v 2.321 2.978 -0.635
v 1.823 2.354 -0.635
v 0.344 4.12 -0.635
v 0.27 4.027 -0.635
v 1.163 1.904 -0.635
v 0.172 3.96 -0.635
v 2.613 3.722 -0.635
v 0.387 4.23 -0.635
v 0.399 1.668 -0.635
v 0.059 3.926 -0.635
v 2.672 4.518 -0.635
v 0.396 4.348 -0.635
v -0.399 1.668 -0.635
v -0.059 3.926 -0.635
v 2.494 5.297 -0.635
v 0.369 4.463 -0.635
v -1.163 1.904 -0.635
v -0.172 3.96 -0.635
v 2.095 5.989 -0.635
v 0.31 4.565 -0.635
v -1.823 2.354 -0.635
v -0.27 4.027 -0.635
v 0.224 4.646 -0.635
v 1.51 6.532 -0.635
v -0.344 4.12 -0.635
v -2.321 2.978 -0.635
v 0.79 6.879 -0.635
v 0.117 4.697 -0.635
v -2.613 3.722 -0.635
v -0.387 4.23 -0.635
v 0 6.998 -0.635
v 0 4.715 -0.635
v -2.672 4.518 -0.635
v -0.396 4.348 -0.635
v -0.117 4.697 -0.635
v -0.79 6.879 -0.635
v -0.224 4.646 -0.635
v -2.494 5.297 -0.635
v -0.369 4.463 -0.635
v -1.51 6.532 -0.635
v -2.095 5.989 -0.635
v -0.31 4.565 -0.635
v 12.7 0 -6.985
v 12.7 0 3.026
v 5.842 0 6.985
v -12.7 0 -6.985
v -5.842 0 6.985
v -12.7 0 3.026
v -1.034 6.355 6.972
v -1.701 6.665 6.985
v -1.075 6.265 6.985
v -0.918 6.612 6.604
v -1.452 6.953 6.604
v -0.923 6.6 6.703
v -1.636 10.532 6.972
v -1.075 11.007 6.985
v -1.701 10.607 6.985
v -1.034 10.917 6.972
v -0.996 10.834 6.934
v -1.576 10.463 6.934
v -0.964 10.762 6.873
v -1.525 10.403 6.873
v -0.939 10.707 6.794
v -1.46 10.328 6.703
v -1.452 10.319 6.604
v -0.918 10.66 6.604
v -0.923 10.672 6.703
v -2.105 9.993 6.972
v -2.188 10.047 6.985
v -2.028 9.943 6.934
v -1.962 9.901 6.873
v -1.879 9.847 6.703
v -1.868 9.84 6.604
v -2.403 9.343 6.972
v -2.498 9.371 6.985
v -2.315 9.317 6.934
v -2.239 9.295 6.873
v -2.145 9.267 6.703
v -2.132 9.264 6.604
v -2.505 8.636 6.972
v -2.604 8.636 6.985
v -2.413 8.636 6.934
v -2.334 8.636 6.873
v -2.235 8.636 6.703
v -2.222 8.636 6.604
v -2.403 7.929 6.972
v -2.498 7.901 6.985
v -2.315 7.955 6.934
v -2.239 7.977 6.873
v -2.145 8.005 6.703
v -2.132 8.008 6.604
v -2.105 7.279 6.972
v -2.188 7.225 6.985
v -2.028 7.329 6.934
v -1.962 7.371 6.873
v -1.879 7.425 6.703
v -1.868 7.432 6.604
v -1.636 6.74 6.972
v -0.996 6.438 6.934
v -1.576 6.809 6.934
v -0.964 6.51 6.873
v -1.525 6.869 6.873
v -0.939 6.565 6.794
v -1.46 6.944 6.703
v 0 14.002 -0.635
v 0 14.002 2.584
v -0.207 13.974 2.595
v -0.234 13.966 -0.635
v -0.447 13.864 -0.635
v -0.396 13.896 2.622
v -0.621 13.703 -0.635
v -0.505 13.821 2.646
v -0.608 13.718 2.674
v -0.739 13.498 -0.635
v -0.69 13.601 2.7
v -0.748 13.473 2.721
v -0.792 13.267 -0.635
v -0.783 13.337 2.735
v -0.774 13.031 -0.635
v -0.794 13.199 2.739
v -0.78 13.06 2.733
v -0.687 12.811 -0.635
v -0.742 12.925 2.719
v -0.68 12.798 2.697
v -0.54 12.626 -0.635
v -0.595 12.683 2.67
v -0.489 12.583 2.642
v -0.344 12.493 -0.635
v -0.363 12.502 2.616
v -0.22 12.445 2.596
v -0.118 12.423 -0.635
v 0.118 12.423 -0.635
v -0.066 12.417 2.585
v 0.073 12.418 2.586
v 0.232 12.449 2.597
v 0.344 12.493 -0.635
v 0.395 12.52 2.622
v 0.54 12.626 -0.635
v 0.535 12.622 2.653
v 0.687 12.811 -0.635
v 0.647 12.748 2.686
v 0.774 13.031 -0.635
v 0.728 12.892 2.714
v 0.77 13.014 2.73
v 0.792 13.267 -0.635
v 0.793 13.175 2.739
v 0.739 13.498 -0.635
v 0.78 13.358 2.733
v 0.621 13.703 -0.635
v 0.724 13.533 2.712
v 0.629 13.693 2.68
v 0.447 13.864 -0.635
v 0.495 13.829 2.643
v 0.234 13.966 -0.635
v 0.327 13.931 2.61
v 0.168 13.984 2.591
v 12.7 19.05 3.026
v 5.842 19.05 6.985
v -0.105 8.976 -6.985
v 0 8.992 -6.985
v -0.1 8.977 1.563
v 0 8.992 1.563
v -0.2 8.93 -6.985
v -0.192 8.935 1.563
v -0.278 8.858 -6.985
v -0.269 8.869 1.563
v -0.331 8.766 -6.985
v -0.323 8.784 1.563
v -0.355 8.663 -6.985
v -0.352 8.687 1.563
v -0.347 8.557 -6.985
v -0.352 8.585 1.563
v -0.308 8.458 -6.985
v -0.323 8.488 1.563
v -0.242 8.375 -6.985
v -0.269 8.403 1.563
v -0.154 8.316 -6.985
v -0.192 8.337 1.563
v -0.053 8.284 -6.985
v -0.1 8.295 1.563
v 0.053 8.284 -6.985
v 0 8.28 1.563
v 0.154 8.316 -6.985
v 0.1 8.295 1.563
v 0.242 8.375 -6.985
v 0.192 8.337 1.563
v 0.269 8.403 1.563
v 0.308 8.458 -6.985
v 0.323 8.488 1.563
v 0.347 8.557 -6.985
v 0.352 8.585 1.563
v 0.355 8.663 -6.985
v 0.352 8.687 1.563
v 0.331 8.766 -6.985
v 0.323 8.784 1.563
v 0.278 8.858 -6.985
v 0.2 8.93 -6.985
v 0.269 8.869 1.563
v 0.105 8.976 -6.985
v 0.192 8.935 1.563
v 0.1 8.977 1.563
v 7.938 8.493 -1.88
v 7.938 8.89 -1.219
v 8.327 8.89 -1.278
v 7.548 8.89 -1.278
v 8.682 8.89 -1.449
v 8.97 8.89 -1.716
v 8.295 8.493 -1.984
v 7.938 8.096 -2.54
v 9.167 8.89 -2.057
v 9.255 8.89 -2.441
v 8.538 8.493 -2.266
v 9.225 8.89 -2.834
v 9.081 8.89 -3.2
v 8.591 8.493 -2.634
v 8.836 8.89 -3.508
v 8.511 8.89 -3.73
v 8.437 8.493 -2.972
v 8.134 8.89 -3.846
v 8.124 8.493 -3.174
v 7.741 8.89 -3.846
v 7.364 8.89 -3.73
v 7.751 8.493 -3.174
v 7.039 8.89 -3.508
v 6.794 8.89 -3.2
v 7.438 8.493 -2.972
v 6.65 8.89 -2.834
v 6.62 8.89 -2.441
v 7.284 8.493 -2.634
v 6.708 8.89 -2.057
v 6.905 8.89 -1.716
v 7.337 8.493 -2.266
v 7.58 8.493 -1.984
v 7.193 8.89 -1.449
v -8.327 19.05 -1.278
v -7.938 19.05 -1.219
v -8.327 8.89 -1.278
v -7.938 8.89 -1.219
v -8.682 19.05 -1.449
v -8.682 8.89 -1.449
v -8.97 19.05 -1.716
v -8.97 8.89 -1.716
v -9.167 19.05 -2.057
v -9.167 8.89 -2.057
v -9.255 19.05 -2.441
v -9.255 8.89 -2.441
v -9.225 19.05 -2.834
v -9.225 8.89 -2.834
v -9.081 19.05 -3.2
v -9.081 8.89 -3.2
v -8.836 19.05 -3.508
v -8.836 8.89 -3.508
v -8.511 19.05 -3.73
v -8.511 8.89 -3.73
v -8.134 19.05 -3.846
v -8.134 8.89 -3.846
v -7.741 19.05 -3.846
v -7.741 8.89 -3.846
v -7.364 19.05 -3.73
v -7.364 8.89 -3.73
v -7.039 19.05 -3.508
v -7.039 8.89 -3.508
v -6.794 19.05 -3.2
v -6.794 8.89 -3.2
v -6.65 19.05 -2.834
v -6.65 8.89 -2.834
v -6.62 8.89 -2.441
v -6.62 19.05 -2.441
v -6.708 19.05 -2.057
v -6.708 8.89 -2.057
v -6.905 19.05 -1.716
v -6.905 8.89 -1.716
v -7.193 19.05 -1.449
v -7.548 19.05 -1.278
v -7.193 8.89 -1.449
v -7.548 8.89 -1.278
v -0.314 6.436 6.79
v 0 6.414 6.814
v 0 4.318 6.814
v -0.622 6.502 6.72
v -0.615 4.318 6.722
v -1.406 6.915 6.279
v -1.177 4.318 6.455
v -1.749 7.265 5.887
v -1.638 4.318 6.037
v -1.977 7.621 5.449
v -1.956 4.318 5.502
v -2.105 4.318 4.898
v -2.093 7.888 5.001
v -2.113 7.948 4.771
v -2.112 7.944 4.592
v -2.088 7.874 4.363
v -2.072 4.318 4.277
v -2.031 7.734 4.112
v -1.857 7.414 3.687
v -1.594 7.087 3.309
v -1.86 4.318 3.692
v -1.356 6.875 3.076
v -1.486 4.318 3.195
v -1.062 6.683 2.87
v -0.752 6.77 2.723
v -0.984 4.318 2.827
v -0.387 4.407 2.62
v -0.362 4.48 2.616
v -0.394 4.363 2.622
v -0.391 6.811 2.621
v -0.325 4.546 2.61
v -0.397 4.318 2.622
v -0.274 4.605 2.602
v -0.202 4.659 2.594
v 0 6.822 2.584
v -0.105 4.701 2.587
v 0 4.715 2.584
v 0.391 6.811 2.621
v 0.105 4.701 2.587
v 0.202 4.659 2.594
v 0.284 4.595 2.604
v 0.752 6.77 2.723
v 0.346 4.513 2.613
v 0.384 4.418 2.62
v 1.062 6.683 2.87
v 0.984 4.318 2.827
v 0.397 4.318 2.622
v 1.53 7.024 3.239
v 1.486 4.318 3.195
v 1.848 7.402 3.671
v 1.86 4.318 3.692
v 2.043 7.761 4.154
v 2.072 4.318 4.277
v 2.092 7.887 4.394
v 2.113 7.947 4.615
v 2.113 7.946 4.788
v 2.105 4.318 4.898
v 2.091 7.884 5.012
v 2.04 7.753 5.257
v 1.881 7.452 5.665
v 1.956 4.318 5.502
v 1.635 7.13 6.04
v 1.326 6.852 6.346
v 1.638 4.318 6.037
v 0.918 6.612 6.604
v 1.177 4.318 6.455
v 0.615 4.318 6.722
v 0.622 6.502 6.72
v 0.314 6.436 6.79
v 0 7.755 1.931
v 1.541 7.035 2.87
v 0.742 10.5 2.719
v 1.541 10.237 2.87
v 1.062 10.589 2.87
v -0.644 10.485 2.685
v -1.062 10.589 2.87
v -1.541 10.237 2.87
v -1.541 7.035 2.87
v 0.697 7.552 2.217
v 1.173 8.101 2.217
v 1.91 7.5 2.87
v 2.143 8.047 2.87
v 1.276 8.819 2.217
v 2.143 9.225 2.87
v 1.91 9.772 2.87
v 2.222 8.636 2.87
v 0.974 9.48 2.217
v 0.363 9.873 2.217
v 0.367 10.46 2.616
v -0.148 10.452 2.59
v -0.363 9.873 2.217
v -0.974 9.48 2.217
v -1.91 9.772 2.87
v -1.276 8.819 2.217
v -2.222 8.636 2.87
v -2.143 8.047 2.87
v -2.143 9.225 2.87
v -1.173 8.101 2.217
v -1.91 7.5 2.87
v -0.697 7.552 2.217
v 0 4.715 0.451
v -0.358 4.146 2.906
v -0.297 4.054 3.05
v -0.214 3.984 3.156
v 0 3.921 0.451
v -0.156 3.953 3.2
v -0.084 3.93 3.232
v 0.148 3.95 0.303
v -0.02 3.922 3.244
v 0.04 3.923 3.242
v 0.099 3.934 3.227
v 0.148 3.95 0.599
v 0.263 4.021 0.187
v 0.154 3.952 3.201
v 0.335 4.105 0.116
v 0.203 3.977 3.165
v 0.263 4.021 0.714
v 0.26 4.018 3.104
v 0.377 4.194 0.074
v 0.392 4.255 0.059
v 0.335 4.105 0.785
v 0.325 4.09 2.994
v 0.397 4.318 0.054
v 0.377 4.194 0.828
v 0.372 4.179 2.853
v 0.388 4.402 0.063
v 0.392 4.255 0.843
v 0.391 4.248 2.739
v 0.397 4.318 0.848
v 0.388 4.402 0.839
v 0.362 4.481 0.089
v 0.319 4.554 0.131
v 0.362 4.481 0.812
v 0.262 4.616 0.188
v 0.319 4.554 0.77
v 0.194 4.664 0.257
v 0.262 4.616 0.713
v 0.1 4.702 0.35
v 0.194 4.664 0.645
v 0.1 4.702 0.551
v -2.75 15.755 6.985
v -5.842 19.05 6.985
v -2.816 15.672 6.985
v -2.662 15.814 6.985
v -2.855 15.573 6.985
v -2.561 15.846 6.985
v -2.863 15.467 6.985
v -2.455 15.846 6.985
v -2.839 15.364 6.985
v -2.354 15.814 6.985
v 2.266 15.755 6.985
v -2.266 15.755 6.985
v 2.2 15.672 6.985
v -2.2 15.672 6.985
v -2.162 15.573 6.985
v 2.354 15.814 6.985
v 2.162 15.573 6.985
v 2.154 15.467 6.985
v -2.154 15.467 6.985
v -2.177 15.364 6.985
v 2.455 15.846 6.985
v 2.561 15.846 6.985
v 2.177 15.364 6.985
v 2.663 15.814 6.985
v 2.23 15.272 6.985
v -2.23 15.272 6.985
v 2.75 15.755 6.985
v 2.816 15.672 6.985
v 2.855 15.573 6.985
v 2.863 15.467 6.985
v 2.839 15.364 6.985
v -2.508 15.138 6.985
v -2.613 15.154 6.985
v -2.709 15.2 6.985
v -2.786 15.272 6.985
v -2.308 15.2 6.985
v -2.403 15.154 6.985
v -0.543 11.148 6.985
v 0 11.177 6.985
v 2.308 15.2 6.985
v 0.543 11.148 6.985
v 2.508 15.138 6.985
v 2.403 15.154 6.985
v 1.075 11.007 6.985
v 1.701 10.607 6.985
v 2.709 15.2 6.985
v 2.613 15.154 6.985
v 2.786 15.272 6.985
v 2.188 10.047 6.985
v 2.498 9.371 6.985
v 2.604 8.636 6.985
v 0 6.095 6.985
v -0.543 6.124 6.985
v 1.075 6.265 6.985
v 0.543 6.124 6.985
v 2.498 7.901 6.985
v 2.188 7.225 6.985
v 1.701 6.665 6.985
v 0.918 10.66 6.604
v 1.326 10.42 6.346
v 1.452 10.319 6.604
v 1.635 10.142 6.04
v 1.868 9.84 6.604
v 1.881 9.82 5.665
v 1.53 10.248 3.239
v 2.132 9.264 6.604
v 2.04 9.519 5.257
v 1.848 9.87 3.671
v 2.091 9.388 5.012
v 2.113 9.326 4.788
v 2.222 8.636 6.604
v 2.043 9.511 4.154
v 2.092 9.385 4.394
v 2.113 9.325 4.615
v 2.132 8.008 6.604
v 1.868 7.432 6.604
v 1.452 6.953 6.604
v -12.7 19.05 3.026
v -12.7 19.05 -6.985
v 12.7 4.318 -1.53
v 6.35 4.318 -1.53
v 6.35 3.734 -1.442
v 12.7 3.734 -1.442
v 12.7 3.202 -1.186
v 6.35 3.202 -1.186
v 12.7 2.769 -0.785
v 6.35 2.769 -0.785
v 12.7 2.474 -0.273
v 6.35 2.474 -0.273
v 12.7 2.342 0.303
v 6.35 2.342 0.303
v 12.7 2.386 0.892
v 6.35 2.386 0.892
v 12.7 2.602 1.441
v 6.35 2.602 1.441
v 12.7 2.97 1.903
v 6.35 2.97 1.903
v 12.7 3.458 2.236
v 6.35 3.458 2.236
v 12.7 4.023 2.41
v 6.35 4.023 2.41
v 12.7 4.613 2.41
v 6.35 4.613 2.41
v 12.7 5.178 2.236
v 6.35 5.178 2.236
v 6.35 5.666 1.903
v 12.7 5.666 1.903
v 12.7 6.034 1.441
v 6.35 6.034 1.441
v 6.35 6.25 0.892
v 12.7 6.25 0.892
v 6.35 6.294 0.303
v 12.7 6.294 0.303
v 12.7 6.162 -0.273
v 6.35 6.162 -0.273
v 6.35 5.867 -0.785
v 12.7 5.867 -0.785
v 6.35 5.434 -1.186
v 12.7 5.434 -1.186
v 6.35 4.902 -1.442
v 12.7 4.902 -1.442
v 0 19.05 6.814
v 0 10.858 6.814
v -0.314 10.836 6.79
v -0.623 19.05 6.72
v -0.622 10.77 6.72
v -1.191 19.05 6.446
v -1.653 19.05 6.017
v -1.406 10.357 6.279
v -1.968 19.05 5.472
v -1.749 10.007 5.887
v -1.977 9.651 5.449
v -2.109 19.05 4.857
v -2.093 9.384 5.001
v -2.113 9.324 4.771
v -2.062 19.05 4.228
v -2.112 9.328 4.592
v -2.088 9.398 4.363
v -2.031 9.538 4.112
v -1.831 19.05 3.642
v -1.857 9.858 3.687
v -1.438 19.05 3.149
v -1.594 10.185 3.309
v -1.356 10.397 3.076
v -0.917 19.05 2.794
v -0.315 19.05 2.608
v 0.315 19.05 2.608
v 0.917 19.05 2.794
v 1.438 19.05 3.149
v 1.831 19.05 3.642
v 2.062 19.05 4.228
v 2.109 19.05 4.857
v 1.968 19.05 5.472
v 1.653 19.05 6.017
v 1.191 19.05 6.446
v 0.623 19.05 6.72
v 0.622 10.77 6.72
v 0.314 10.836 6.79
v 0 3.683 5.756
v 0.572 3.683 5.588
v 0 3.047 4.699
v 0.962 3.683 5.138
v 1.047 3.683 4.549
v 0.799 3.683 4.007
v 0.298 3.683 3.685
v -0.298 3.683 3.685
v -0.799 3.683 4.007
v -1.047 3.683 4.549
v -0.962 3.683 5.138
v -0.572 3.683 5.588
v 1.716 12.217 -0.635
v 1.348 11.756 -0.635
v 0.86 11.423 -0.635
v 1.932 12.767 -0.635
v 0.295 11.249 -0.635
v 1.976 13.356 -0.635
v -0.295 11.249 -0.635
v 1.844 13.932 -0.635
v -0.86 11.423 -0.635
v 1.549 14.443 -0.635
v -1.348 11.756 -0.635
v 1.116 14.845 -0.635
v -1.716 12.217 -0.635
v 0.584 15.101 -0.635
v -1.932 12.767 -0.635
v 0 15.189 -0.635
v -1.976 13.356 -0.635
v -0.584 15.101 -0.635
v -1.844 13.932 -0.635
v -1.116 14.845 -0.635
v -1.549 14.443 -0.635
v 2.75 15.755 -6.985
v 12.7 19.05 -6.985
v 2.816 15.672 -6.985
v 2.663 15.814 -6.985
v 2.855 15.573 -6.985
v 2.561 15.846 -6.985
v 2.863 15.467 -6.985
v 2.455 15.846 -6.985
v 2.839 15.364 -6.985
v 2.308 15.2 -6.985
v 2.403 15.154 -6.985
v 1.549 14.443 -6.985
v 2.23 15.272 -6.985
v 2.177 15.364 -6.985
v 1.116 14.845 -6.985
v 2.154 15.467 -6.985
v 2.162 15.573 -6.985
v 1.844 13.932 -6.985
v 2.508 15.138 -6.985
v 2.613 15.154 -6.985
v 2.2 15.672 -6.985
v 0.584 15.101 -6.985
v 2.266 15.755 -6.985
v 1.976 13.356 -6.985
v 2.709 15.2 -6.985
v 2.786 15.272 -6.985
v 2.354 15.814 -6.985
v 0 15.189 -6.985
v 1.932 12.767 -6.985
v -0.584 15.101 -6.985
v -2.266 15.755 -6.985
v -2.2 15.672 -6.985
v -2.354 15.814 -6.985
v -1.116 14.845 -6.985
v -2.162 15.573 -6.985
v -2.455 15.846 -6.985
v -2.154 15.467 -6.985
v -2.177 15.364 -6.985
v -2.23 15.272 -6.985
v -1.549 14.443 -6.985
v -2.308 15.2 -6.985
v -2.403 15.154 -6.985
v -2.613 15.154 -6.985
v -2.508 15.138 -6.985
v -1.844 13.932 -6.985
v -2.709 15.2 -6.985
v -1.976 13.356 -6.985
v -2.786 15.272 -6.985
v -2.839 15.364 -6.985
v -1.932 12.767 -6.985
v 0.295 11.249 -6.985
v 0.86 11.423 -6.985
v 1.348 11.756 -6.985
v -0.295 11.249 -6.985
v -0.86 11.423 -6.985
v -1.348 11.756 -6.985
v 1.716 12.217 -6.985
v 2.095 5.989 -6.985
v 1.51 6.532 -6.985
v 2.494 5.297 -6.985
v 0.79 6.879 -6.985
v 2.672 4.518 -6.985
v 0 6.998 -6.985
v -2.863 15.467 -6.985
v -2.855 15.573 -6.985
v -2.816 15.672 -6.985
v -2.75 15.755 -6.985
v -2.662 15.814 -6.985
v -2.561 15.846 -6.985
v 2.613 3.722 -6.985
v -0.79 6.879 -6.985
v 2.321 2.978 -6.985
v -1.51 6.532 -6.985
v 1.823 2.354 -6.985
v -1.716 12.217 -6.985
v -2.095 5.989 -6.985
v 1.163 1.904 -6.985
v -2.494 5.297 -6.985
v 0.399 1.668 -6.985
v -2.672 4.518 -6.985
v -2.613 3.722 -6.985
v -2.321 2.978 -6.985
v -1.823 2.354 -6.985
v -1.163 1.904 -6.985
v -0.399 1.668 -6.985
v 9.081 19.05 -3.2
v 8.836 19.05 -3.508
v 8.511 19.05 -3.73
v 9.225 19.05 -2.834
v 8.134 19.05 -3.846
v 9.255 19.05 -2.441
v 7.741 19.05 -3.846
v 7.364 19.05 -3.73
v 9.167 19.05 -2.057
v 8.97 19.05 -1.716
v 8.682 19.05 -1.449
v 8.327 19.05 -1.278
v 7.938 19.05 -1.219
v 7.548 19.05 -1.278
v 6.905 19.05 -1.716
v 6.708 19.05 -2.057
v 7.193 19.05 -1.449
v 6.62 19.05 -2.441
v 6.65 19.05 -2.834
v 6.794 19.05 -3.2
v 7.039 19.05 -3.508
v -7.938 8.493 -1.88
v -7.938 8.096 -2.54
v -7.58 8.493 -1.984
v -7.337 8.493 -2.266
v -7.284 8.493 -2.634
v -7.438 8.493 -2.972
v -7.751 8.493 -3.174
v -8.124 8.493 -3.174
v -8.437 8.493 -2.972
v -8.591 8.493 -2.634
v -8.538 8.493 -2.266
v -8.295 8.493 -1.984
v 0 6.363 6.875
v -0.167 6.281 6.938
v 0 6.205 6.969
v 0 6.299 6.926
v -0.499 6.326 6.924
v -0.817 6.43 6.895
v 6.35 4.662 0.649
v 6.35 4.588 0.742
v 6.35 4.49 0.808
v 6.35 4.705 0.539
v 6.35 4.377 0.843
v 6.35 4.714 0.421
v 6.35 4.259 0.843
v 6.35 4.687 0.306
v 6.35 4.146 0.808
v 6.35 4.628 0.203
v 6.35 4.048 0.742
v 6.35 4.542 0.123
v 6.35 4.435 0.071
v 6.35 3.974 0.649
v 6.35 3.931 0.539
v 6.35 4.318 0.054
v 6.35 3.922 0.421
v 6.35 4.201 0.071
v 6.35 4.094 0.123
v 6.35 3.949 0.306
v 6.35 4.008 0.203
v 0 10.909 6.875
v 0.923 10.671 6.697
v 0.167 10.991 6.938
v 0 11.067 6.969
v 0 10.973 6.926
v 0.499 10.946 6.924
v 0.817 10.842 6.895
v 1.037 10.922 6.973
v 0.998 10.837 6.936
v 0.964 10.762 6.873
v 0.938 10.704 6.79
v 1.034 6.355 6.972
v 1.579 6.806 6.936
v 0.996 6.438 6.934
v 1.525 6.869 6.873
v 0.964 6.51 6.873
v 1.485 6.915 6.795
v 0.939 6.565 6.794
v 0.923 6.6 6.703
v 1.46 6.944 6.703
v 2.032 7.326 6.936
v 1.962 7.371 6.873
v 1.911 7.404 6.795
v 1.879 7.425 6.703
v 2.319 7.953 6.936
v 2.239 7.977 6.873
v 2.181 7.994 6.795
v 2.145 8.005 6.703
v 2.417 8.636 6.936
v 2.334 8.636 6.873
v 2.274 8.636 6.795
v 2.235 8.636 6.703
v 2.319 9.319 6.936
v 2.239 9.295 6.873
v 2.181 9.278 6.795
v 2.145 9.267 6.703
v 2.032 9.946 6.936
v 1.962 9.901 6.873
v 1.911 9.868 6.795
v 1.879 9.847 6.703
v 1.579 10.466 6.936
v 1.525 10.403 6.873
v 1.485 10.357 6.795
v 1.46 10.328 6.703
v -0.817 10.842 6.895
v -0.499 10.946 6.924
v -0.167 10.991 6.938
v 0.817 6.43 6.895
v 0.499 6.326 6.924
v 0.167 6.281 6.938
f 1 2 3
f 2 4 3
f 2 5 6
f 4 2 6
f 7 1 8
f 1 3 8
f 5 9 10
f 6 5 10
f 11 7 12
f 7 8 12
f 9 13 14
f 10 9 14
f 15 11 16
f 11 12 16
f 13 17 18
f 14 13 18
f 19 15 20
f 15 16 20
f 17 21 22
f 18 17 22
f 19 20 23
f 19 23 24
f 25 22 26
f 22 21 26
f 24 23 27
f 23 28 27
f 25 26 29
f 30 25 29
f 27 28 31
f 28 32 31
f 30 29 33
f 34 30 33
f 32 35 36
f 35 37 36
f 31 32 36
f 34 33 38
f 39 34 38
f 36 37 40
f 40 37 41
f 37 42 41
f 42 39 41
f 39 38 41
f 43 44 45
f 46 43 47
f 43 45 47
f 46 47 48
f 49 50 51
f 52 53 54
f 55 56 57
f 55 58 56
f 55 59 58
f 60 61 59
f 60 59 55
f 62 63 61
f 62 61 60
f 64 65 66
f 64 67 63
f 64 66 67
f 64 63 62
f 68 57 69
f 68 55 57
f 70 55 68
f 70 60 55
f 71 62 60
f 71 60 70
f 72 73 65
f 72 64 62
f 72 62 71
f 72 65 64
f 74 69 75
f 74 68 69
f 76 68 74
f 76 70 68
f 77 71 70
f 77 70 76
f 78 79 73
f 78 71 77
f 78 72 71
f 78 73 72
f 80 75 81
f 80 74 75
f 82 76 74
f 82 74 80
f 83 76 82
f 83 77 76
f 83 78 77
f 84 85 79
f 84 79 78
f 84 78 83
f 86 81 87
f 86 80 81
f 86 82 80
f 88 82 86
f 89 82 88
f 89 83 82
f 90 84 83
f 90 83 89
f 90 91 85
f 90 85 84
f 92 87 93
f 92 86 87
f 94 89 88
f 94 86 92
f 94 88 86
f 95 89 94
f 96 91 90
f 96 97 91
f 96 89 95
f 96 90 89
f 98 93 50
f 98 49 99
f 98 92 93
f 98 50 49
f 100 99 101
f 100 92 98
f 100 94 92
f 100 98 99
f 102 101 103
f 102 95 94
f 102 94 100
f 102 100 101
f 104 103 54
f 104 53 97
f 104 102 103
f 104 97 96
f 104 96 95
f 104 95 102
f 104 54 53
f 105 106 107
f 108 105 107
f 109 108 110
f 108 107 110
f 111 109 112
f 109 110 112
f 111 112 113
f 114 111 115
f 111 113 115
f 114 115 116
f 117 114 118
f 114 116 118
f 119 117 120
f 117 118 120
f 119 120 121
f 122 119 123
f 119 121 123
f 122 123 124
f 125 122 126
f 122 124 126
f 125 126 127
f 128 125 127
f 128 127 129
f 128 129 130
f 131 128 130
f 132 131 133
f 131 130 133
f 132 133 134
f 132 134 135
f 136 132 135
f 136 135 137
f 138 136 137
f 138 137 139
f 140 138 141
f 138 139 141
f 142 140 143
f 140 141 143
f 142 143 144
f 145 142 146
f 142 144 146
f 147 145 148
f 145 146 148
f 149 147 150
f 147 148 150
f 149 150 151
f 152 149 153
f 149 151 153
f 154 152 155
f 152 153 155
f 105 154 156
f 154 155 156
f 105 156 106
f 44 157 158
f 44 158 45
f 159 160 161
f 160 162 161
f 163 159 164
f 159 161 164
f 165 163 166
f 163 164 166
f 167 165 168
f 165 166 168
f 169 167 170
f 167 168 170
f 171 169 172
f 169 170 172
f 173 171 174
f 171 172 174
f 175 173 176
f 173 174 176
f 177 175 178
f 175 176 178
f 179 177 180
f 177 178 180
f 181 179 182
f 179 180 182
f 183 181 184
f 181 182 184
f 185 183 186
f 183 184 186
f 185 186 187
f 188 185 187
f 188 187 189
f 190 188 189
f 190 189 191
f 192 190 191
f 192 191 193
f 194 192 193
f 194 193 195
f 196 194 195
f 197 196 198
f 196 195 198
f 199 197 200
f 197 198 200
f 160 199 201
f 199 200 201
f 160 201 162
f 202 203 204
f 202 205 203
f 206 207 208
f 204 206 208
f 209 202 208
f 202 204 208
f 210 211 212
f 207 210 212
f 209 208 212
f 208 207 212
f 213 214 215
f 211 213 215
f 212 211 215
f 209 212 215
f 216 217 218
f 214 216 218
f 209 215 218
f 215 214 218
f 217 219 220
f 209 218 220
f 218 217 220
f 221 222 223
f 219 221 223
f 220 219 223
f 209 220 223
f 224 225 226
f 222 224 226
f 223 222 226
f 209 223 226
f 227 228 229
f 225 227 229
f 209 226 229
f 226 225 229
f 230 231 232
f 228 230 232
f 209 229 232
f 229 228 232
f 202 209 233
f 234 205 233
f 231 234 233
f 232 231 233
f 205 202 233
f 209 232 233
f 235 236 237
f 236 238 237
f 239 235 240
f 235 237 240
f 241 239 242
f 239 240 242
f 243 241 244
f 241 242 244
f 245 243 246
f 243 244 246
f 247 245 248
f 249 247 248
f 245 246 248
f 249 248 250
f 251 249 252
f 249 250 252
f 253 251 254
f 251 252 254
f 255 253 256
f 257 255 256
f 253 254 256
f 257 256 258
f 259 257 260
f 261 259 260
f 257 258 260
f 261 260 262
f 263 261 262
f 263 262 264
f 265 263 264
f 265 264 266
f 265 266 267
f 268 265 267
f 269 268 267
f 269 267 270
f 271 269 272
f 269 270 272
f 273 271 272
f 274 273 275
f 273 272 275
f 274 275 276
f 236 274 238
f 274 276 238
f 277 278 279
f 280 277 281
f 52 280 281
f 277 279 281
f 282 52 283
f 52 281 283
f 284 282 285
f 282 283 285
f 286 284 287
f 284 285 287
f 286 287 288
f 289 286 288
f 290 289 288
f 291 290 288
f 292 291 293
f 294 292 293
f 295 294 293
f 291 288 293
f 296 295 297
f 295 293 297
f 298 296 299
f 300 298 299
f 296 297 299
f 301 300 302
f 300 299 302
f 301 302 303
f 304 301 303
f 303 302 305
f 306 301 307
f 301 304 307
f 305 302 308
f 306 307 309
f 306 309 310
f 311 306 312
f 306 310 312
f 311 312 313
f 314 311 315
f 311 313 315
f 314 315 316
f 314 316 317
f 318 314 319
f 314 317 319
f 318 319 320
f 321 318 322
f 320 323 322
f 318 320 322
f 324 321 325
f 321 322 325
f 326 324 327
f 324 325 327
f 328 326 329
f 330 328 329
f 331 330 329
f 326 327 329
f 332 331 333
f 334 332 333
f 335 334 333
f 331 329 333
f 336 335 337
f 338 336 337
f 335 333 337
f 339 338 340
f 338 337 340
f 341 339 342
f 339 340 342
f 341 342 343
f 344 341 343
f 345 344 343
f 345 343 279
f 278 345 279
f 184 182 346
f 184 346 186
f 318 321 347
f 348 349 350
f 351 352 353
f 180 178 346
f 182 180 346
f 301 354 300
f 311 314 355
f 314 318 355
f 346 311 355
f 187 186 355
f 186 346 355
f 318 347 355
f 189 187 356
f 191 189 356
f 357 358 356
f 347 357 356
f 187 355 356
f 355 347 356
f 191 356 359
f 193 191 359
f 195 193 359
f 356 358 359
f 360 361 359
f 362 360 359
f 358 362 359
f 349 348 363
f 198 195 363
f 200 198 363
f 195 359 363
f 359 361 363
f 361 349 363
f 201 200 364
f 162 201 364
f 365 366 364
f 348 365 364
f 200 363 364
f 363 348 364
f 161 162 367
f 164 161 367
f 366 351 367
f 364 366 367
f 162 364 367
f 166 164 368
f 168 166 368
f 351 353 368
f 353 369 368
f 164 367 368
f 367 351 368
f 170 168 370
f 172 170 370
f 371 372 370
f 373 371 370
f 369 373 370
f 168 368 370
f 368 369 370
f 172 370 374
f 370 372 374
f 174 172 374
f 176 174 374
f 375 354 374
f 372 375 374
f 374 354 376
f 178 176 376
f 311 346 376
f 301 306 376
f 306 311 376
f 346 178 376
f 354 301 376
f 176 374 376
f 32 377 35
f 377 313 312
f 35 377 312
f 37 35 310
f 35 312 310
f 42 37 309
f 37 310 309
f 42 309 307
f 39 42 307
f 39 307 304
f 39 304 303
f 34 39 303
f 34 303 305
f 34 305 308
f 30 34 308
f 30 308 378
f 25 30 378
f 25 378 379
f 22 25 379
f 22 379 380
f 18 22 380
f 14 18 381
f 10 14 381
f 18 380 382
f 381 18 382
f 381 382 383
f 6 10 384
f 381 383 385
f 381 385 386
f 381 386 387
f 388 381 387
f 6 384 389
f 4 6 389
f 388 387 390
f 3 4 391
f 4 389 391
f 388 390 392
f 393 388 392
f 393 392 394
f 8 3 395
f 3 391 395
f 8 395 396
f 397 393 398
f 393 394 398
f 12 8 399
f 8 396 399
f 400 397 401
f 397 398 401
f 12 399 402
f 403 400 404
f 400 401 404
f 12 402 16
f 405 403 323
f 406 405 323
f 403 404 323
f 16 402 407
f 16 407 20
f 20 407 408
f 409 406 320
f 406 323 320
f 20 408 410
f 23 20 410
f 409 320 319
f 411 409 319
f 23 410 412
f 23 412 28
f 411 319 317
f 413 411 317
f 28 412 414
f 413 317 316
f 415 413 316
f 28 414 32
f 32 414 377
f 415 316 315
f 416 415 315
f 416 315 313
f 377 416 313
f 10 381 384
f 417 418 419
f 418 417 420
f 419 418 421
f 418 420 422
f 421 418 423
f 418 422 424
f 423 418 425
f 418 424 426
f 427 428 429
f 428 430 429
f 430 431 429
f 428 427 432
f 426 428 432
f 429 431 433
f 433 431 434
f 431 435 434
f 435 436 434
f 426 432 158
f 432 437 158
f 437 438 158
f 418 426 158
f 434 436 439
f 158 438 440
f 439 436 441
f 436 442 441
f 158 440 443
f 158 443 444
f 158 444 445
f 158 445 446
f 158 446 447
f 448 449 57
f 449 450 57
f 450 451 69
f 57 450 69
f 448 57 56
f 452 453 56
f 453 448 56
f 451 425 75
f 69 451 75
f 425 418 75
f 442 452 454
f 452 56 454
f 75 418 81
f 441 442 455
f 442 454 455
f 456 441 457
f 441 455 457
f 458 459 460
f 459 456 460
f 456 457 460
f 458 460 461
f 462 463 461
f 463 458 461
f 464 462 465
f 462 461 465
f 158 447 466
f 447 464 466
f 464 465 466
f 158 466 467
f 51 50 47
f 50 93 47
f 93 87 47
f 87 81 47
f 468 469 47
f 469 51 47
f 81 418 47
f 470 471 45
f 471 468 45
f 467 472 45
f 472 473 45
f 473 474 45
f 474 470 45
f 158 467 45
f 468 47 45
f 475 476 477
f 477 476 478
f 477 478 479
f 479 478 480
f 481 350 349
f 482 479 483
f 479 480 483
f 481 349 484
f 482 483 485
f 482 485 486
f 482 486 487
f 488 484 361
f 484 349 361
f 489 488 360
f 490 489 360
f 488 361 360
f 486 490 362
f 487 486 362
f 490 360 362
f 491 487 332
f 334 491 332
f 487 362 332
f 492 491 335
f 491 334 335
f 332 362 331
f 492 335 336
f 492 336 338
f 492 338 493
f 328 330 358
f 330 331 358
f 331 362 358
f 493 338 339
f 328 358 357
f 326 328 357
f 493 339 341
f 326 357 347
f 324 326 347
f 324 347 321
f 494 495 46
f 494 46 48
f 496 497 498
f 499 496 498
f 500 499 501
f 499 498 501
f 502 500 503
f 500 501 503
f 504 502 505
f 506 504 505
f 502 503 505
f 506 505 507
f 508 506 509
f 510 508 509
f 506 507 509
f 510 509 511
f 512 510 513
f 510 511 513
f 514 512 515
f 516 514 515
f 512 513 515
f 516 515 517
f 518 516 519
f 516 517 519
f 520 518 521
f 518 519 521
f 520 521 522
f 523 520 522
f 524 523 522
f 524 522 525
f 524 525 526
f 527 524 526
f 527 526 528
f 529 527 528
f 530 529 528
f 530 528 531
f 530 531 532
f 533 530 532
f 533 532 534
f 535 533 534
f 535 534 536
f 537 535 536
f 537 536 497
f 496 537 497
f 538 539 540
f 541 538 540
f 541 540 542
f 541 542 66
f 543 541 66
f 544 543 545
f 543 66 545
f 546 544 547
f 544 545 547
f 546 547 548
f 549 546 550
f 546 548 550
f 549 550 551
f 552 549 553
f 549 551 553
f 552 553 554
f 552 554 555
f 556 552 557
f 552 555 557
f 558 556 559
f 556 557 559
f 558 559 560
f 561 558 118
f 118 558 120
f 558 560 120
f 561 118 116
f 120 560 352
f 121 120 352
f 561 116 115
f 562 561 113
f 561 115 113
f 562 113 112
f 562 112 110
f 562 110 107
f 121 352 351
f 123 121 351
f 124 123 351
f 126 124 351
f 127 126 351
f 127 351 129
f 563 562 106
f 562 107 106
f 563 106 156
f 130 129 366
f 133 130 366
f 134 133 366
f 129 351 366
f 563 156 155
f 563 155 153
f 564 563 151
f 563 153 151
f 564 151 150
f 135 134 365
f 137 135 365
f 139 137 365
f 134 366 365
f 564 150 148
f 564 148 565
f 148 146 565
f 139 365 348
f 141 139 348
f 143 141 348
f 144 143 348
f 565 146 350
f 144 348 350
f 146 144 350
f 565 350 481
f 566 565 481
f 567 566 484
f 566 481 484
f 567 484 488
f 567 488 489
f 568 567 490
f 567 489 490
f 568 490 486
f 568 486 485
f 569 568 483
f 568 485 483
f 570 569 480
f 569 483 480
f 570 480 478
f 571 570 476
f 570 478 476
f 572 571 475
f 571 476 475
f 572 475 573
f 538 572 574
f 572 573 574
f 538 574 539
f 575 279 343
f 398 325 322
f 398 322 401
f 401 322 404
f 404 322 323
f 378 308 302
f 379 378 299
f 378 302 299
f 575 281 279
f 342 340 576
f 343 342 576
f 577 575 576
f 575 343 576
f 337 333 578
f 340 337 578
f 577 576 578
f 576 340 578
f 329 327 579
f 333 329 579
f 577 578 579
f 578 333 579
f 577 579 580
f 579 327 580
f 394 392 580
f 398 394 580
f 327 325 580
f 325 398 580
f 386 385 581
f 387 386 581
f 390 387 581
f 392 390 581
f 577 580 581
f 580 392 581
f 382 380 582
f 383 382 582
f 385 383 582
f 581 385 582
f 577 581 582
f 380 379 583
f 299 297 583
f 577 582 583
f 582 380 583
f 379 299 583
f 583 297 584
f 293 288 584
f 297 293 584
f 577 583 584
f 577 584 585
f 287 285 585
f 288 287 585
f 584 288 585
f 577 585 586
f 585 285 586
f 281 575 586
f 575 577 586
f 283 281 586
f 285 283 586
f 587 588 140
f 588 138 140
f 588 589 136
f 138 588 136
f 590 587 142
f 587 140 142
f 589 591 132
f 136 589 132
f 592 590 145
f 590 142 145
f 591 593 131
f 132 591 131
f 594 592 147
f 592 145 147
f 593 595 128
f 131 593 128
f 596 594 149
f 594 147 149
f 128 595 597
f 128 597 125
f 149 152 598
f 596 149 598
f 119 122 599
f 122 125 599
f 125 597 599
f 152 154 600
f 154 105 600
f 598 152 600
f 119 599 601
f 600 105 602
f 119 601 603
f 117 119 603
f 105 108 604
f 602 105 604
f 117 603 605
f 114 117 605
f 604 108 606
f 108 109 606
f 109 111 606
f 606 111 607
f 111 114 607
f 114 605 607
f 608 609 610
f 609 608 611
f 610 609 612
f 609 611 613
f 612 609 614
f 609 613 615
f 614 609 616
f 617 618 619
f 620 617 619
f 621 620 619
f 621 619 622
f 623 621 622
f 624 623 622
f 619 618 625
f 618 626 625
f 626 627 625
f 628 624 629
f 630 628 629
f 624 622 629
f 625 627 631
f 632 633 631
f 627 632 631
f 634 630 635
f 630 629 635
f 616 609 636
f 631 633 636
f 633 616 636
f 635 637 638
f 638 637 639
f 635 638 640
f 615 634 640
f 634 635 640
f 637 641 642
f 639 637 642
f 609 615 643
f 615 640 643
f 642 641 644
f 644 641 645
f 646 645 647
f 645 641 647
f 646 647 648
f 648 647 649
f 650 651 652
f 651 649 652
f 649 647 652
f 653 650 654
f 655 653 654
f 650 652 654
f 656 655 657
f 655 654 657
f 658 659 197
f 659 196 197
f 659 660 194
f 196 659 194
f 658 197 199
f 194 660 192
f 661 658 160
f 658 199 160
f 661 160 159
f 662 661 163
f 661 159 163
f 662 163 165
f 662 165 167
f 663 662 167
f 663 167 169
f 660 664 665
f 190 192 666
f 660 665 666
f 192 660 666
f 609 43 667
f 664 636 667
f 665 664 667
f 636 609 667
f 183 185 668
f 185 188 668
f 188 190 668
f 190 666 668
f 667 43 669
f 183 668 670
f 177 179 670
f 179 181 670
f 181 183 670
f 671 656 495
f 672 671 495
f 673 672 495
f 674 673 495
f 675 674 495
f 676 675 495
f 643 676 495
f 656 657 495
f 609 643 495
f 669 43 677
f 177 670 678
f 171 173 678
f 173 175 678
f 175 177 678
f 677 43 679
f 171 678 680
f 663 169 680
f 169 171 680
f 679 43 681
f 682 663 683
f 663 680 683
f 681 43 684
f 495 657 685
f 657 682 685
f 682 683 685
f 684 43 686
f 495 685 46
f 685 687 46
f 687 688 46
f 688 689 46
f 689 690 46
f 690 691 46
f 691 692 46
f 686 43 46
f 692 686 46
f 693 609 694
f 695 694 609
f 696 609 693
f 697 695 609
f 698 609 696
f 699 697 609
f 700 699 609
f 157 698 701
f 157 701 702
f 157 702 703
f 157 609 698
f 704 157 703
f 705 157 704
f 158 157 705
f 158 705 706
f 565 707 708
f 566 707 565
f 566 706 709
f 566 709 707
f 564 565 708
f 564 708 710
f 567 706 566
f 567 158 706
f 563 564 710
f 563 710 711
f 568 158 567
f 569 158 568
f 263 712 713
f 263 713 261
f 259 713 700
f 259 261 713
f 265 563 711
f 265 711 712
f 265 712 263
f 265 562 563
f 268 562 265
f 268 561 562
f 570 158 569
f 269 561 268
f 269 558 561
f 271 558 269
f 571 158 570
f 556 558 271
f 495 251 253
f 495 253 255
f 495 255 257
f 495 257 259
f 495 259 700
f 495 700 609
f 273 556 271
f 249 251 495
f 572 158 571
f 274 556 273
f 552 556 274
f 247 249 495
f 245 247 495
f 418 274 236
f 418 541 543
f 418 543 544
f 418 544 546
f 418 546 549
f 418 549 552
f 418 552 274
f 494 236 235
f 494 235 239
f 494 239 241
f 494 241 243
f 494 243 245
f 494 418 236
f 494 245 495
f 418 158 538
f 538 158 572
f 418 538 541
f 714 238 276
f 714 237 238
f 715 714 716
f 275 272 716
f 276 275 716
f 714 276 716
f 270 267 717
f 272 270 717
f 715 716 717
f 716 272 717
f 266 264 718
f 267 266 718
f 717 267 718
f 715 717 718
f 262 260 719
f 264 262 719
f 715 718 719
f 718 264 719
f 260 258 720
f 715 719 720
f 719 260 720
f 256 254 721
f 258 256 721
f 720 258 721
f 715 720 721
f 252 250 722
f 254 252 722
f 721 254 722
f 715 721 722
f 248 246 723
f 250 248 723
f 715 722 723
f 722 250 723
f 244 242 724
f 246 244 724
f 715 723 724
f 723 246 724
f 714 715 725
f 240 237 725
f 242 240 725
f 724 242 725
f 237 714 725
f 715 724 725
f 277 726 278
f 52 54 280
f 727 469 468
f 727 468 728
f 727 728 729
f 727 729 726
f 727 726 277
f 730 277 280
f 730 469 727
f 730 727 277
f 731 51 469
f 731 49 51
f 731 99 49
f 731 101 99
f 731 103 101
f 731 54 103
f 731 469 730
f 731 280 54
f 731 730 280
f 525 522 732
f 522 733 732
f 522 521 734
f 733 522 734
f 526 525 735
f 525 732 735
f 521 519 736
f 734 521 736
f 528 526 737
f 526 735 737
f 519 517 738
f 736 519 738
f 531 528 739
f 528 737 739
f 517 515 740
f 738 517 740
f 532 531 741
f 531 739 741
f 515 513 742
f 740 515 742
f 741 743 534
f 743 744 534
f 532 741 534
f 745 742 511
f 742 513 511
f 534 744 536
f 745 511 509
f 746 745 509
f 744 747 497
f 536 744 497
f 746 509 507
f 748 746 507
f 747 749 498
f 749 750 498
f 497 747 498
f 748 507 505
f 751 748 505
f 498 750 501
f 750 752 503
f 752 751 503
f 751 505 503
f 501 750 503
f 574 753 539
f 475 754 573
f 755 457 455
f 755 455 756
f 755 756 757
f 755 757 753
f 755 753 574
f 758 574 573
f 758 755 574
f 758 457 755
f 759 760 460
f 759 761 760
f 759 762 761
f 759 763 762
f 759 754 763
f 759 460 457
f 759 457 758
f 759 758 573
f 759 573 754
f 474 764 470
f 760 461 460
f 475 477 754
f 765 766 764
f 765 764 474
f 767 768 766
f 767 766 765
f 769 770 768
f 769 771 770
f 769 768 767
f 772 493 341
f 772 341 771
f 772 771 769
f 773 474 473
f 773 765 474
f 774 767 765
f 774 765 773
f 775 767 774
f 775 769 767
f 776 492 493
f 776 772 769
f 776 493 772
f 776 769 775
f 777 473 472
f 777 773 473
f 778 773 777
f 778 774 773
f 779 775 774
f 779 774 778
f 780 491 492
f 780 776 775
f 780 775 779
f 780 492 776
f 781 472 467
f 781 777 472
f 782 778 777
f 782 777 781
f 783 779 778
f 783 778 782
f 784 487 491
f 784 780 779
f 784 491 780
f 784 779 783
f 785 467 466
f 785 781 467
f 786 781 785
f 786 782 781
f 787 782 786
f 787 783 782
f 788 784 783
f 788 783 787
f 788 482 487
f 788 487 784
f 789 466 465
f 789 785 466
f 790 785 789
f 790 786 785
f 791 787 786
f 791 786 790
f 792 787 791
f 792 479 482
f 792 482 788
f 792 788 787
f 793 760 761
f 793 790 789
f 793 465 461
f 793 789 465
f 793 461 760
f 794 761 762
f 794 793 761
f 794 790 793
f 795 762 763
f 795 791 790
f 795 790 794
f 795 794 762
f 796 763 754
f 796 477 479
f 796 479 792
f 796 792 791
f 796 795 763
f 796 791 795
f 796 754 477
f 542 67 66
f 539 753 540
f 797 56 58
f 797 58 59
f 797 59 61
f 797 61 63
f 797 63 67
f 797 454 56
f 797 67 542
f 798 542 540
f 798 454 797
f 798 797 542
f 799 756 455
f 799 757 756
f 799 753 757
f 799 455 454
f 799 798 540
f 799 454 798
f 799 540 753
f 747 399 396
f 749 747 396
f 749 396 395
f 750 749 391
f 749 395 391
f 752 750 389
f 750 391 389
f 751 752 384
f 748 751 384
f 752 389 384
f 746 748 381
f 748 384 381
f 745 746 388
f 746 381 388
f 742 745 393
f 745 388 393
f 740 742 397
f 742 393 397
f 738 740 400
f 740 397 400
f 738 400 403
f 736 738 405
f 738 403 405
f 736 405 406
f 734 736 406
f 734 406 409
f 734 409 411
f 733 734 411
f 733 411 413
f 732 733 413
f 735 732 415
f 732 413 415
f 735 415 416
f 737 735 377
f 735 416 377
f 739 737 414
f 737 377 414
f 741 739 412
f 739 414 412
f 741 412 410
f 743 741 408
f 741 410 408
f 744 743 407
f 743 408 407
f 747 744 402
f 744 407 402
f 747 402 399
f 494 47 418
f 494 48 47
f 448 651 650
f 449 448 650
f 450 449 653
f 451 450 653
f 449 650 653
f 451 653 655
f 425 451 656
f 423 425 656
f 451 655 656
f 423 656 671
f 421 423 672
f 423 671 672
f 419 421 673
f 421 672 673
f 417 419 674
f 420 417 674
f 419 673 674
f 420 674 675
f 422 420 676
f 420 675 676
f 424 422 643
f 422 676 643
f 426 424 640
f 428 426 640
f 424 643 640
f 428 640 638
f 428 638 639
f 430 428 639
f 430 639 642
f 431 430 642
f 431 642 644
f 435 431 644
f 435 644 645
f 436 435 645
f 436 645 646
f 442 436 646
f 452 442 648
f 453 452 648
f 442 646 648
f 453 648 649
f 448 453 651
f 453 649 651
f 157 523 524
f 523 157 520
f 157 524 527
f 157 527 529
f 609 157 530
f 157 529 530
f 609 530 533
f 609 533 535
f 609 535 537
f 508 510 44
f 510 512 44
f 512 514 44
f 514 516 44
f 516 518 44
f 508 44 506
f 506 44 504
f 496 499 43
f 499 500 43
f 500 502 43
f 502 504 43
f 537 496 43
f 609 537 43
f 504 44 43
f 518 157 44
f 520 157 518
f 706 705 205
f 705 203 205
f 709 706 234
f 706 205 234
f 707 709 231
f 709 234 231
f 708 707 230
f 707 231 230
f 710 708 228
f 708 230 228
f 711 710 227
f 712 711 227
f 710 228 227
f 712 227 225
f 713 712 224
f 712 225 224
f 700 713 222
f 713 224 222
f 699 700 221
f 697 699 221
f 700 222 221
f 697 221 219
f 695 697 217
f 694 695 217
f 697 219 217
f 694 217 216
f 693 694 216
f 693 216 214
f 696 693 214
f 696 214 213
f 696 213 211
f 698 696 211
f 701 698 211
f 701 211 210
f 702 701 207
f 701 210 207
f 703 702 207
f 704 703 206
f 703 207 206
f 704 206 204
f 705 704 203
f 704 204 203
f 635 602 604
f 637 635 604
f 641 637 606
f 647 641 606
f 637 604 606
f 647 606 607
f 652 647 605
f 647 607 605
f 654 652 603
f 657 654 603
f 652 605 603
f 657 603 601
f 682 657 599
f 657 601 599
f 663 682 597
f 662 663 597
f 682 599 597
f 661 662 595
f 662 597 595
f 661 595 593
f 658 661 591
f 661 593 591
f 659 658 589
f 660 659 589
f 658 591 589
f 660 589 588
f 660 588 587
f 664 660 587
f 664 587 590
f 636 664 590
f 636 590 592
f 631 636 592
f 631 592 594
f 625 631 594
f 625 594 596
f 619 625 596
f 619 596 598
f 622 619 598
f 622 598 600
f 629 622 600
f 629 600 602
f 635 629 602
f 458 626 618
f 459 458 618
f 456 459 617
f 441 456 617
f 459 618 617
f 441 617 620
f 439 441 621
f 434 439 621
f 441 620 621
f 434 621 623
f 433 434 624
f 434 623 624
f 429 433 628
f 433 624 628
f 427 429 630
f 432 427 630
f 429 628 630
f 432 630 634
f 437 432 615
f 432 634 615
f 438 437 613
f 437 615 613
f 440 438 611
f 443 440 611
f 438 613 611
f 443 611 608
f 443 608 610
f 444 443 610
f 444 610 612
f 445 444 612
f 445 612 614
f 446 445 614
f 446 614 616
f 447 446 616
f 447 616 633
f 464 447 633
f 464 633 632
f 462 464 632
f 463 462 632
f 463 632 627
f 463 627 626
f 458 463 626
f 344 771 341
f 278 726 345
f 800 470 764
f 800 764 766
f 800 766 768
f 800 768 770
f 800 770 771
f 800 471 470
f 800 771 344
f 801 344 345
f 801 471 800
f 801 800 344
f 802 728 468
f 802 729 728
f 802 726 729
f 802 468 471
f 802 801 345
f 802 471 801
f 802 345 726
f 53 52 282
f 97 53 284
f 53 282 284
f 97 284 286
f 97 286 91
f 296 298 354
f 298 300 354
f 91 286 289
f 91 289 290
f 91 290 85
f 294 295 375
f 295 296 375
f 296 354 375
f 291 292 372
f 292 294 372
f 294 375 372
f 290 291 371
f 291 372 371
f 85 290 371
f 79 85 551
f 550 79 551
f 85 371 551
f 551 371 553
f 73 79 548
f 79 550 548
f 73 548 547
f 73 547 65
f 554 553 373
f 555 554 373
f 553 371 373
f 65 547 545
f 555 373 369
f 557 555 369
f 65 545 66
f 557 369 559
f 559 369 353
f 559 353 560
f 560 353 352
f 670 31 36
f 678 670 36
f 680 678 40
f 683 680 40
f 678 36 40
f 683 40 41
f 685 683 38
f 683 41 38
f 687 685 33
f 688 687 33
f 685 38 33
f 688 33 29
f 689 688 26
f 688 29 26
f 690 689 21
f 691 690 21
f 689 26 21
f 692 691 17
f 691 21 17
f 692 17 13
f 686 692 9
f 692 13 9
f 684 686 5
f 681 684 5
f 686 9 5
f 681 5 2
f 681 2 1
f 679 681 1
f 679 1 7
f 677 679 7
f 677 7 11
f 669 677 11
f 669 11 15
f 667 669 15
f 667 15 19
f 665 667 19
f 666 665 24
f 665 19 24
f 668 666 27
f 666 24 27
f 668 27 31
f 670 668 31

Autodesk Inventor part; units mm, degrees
ref_plane "YZ Plane" through (0, 0, 0) normal (1, 0, 0) x (0, 1, 0)
ref_plane "XZ Plane" through (0, 0, 0) normal (0, 1, 0) x (-1, 0, 0)
ref_plane "XY Plane" through (0, 0, 0) normal (0, 0, 1) x (1, 0, 0)
sketch "Sketch1" plane through (0, 0, 0) normal (0, 1, 0) x (-1, 0, 0)
  line L0 (12.7, 6.985) -> (-12.7, 6.985)
  line L1 (-12.7, 6.985) -> (-12.7, -6.985)
  line L2 (-12.7, -6.985) -> (12.7, -6.985)
  line L3 (12.7, -6.985) -> (12.7, 6.985)
  point P0 (0, 0)
  dimension "depth" = 25.4
  dimension "width" = 13.97
  dimension "d5" = 6.985
  dimension "d6" = 12.7
extrude "body" add sketch "Sketch1" along normal blind 19.05
sketch "Sketch3" plane through (12.7, 0, 6.985) normal (1, 0, 0) x (0, 0, -1)
  point P0 (6.985, 0)
sketch "Sketch5" plane through (0, 19.05, 0) normal (0, 1, 0) x (1, 0, 0)
  line L0 (-12.7, -6.985) -> (12.7, -6.985) projected
  point P0 (0, 0)
  point P1 (0, -4.699)
  dimension "d25" = 0
  dimension "d34" = 6.985
  dimension "hole_radius" = 2.286
hole "main odor hole" at (0, 19.05, 4.699) direction (0, -1, 0) diameter 4.2291 depth 14.732 tip angle 118
sketch "Sketch6" plane through (-12.7, 0, 6.985) normal (0, 0, 1) x (1, 0, 0)
  line L0 (0, 0) -> (25.4, 0) projected
  point P0 (12.7, 0)
  point P1 (15.2082, 15.494)
  point P2 (10.1917, 15.494)
  dimension "d126" = 15.494
  dimension "d127" = 5.0165
  dimension "d128" = 2.5082
hole "lickports" at (2.5083, 15.494, 6.985) at (-2.5082, 15.494, 6.985) direction (0, 0, -1) diameter 0.7112 end through all
sketch "Sketch7" plane through (12.7, 0, -6.985) normal (0, 0, -1) x (-1, 0, 0)
  line L0 (14.8146, 4.318) -> (10.5855, 4.318) projected
  point P0 (12.7, 0)
  point P1 (12.7, 4.318)
hole "fitting threads" at (0, 4.318, -6.985) direction (0, 0, 1) diameter 5.3594 depth 6.35 thread size "1/4-28 UNF" class "2B" standard "ANSI Unified Screw Threads"
sketch "Sketch8" plane through (0, 4.318, -0.635) normal (0, 0, -1) x (-1, 0, 0)
  line L0 (2.1146, 0) -> (-2.1145, 0) projected
  point P0 (0, -4.318)
  point P1 (0, 0)
hole "input odor hole" at (0, 4.318, -0.635) direction (0, 0, 1) diameter 0.7937 depth 5.08
sketch "Sketch9" plane through (-12.7, 0, 6.985) normal (0, 0, 1) x (1, 0, 0)
  line L0 (0, 0) -> (25.4, 0) projected
  point P0 (12.7, 0)
  point P1 (12.7, 8.636)
  point P2 (12.7, 0)
  dimension "nose_hole" = 8.636
hole "nose_hole" at (0, 8.636, 6.985) direction (0, 0, -1) diameter 4.445 depth 4.1148 tip angle 110
sketch "Sketch10" plane through (0, 19.05, 0) normal (0, 1, 0) x (1, 0, 0)
  point P0 (0, 0)
  point P1 (7.9375, 2.54)
  point P2 (-7.9375, 2.54)
  dimension "d70" = 2.54
  dimension "d116" = 15.875
  dimension "d117" = 7.9375
hole "mount holes" at (7.9375, 19.05, -2.54) at (-7.9375, 19.05, -2.54) direction (0, -1, 0) diameter 2.6416 depth 10.16 tip angle 118 thread size "6-32 UNC" class "2B" standard "ANSI Unified Screw Threads"
sketch "Sketch11" plane through (12.7, 0, -6.985) normal (0, 0, -1) x (-1, 0, 0)
  line L0 (0, 19.05) -> (25.4, 19.05) projected
  line L1 (0, 0) -> (25.4, 0) projected
  point P0 (12.7, 0)
  point P1 (12.7, 13.208)
  point P2 (12.7, 0)
  dimension "vacuum_height" = 5.842
hole "exhaust threading" at (0, 13.208, -6.985) direction (0, 0, 1) diameter 3.9624 depth 6.35 thread size "10-32 UNF" class "2B" standard "ANSI Unified Screw Threads"
sketch "Sketch12" plane through (0, 13.208, -0.635) normal (0, 0, -1) x (-1, 0, 0)
  line L0 (-12.7, -13.208) -> (12.7, -13.208) projected
  line L1 (-12.7, 5.842) -> (12.7, 5.842) projected
  point P0 (0, -13.208)
  point P1 (0, 0)
  point P2 (0, -13.208)
  dimension "d87" = 5.842
hole "exhaust hole" at (0, 13.208, -0.635) direction (0, 0, 1) diameter 1.5875 depth 5.08
sketch "Sketch16" plane through (12.7, 0, -6.985) normal (0, 0, -1) x (-1, 0, 0)
  circle A0 centre (12.7, 8.636) radius 2.9083 projected
  line L0 (15.6083, 8.636) -> (12.7, 8.636)
  point P0 (12.7, 0)
hole "sniff_monitoring_hole" at (0, 8.636, -6.985) direction (0, 0, 1) diameter 0.7112 end through all
fillet "nose hole fillet" [suppressed]
sketch "Sketch25" plane through (12.7, 0, 6.985) normal (1, 0, 0) x (0, 0, -1)
  line L0 (7.62, 1.6383) -> (7.62, 6.9977) projected
  point P0 (6.985, 0)
  point P1 (7.62, 4.318)
  point P2 (6.5343, 4.318)
  point P3 (4.363, 4.318)
  dimension "d147" = 3.257
  dimension "d148" = 1.0857
hole "vac fitting" at (12.7, 4.318, 0.4507) direction (-1, 0, 0) diameter 3.9624 depth 6.35 thread size "10-32 UNF" class "2B" standard "ANSI Unified Screw Threads"
hole "vac hole" at (6.35, 4.318, 0.4507) direction (-1, 0, 0) diameter 0.7937 depth 6.35 tip angle 118
chamfer "front panel chamfer" distance 6.858 angle 30 2 edges at (12.7, 9.525, 6.985) (-12.7, 9.525, 6.985) measured on face at (9.2021, 9.318, 6.985)
fillet "Fillet4" radius 0.381 1 edges at (0, 10.8585, 6.985)
equation "\"d5\" = 0.5 * width"
equation "\"d6\" = 0.5 * depth"
equation "\"d27\" = 1.85 * hole_radius"
equation "\"d29\" = 2 * hole_radius"
equation "\"d127\" = 2 * hole_radius + 0.625 * lick_port_diam"
equation "\"d128\" = 0.5 * d127"
equation "\"d66\" = 1.8 * hole_radius"
equation "\"d117\" = 0.5 * d116"
equation "\"d87\" = vacuum_height"
equation "\"d148\" = 0.333333 * d147"
equation "\"d150\" = vac_thread_depth"
equation "\"d154\" = vac_fit_depth"
equation "\"vac_thread_depth\" = 5.08"
equation "\"vac_fit_depth\" = 6.35"
equation "\"lick_port_diam\" = 0.7112"
properties part number "odorport_final_wvac"
